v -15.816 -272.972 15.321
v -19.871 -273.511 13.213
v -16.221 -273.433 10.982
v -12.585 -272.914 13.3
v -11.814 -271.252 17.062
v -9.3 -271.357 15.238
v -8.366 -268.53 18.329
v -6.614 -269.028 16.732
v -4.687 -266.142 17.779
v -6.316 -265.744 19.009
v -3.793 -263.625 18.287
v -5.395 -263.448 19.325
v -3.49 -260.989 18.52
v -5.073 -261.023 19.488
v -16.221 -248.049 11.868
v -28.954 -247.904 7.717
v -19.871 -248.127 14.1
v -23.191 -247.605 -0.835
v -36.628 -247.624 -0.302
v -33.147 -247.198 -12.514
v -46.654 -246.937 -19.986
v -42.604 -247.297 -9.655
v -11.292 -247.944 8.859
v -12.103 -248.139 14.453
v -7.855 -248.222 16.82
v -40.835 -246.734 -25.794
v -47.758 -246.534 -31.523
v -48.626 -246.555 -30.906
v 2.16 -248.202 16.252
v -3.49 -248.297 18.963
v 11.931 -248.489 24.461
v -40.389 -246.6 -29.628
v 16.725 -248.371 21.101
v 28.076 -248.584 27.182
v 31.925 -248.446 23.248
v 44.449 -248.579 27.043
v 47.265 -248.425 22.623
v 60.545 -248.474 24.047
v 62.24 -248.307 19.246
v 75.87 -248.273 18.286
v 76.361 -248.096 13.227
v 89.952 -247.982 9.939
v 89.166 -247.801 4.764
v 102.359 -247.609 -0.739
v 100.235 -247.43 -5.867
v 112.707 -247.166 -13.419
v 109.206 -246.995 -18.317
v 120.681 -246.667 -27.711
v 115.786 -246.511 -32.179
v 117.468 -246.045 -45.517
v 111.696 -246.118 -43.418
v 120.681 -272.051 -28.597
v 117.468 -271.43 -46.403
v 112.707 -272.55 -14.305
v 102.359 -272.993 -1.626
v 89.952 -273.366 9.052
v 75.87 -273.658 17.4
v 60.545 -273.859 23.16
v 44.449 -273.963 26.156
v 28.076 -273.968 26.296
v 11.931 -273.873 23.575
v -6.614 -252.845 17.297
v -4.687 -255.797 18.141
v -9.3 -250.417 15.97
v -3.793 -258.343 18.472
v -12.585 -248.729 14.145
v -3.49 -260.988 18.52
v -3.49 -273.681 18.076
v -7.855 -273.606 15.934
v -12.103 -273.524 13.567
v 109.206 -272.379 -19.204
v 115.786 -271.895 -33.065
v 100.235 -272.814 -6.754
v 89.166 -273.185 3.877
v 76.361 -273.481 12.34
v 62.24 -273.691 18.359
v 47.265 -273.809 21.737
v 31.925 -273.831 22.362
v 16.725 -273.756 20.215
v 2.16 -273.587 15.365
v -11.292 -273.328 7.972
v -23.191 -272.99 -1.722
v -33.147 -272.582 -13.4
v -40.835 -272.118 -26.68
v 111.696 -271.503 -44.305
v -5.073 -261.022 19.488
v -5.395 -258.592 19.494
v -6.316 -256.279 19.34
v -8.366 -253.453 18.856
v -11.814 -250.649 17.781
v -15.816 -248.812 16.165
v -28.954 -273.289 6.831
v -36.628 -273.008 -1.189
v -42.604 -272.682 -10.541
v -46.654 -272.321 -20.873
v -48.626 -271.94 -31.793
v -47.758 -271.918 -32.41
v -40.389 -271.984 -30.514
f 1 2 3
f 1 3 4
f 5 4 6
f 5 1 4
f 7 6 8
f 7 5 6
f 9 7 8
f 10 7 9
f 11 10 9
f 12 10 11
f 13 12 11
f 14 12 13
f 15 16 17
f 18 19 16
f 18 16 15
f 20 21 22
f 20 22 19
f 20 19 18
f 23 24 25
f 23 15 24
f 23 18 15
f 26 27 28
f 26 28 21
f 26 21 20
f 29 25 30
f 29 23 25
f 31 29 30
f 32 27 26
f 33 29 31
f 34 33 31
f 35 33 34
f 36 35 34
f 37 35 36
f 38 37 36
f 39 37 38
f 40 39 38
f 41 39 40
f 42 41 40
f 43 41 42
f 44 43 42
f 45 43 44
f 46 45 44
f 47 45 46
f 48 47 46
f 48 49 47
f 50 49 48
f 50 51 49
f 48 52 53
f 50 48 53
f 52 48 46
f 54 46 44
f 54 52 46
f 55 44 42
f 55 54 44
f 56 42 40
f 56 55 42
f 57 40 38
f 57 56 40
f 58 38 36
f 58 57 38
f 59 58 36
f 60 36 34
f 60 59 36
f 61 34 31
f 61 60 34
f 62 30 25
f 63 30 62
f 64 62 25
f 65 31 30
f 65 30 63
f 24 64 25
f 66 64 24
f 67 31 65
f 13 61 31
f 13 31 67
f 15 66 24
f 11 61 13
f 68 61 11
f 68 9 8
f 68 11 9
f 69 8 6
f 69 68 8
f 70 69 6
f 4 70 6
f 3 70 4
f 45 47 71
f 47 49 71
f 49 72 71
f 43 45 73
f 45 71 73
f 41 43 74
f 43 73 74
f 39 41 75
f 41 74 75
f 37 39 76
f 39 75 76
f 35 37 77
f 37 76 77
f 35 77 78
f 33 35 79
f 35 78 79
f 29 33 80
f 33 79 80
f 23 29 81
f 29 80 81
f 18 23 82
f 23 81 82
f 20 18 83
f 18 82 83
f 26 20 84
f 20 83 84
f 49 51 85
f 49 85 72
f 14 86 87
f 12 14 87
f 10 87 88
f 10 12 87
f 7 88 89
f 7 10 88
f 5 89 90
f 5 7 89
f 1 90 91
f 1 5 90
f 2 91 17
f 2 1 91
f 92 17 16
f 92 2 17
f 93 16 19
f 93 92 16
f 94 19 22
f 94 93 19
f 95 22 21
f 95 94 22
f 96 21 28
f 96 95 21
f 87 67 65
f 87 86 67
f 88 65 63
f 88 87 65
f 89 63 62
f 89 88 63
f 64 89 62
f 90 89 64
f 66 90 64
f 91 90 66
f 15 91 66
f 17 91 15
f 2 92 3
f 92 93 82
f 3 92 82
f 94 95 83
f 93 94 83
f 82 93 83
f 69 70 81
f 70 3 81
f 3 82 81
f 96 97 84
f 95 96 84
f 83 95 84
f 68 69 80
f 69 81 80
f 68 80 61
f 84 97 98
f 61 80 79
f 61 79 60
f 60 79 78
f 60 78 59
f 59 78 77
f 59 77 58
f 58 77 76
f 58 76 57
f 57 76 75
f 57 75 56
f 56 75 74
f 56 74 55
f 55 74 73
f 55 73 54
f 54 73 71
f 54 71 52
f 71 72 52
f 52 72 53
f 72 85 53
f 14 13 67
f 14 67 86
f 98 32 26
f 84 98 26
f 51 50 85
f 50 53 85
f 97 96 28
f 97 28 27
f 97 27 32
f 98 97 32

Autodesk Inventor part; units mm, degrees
ref_plane "YZ Plane" through (0, 0, 0) normal (1, 0, 0) x (0, 1, 0)
ref_plane "XY Plane" through (0, 0, 0) normal (0, 0, 1) x (1, 0, 0)
ref_plane "Work Plane1" through (0, -273.05, 0) normal (0, 1, 0) x (-1, 0, 0)
sketch "Sketch1" plane through (0, -273.05, 0) normal (0, 1, 0) x (-1, 0, 0)
  line L0 (28.2313, 0) -> (-81.8149, 0)
  point P0 (0, 0)
ref_plane "Work Plane2" through (-28.2313, -273.05, 0) normal (0, 0.9994, 0.0349) x (1, 0, 0)
sketch "Sketch2" plane through (-28.2313, -273.05, 0) normal (0, 0.9994, 0.0349) x (1, 0, 0)
  ellipse E0 centre (142.9444, 40.4167) end of major axis (127.2199, 83.6456) minor radius 0.5491 (135.3201, 59.9472) -> (144.2427, 35.2519) ccw projected
  ellipse E1 centre (145.4346, 41.3225) end of major axis (129.7101, 84.5514) minor radius 0.5491 (137.8103, 60.853) -> (146.7329, 36.1577) ccw projected
  line L0 (144.2427, 35.2519) -> (146.7329, 36.1577) projected
  ellipse E2 centre (-15.3961, 31.7454) end of major axis (-31.1205, -11.4836) minor radius 0.5491 (-17.0369, 25.6432) -> (-8.0746, 50.4278) ccw projected
  line L1 (-17.0369, 25.6432) -> (-19.5271, 26.549) projected
  ellipse E3 centre (-17.8862, 32.6512) end of major axis (-33.6107, -10.5778) minor radius 0.5491 (-19.5271, 26.549) -> (-10.5647, 51.3336) ccw projected
  line L2 (-19.5271, 32.4296) -> (-18.2659, 22.0654)
  arc A0 (-18.2659, 22.0654) -> (148.9119, 28.6146) centre (63.7007, 66.7506) ccw
  line L3 (148.9119, 28.6146) -> (145.6991, 46.4313)
  line L4 (145.6991, 46.4313) -> (139.9268, 44.3316)
  line L5 (139.9268, 44.3316) -> (144.0175, 33.0855)
  line L6 (-19.5271, 32.4296) -> (-12.1574, 30.5326)
  line L7 (-12.1574, 30.5326) -> (-12.6035, 26.6966)
  arc A1 (-12.6035, 26.6966) -> (144.0175, 33.0855) centre (64.3823, 62.3675) ccw
  line L8 (24.7417, -18.0874) -> (23.158, -19.0562)
  arc A2 (-20.3945, 31.8123) -> (23.158, -19.0562) centre (36.4902, 36.4371) ccw
  line L9 (-20.3945, 31.8123) -> (-19.5271, 32.4296)
  point P0 (28.2313, 9.5293)
  point P1 (-19.007, 27.8025)
  point P2 (140.8209, 44.6568)
  point P3 (-14.9879, 31.2612)
  point P4 (-17.0369, 25.6432)
  point P5 (-18.7784, 26.2767)
  point P6 (143.311, 45.5626)
  point P7 (-19.5271, 26.549)
  point P8 (-18.9903, 28.0182)
extrude "Extrusion1" add sketch "Sketch2" along normal blind 25.4
fillet "Fillet1" radius 12.7 2 edges at (-4.2815, -248.3136, 19.4469) (-4.2815, -273.6981, 18.5605)
properties part number "thigh_strap_05"
